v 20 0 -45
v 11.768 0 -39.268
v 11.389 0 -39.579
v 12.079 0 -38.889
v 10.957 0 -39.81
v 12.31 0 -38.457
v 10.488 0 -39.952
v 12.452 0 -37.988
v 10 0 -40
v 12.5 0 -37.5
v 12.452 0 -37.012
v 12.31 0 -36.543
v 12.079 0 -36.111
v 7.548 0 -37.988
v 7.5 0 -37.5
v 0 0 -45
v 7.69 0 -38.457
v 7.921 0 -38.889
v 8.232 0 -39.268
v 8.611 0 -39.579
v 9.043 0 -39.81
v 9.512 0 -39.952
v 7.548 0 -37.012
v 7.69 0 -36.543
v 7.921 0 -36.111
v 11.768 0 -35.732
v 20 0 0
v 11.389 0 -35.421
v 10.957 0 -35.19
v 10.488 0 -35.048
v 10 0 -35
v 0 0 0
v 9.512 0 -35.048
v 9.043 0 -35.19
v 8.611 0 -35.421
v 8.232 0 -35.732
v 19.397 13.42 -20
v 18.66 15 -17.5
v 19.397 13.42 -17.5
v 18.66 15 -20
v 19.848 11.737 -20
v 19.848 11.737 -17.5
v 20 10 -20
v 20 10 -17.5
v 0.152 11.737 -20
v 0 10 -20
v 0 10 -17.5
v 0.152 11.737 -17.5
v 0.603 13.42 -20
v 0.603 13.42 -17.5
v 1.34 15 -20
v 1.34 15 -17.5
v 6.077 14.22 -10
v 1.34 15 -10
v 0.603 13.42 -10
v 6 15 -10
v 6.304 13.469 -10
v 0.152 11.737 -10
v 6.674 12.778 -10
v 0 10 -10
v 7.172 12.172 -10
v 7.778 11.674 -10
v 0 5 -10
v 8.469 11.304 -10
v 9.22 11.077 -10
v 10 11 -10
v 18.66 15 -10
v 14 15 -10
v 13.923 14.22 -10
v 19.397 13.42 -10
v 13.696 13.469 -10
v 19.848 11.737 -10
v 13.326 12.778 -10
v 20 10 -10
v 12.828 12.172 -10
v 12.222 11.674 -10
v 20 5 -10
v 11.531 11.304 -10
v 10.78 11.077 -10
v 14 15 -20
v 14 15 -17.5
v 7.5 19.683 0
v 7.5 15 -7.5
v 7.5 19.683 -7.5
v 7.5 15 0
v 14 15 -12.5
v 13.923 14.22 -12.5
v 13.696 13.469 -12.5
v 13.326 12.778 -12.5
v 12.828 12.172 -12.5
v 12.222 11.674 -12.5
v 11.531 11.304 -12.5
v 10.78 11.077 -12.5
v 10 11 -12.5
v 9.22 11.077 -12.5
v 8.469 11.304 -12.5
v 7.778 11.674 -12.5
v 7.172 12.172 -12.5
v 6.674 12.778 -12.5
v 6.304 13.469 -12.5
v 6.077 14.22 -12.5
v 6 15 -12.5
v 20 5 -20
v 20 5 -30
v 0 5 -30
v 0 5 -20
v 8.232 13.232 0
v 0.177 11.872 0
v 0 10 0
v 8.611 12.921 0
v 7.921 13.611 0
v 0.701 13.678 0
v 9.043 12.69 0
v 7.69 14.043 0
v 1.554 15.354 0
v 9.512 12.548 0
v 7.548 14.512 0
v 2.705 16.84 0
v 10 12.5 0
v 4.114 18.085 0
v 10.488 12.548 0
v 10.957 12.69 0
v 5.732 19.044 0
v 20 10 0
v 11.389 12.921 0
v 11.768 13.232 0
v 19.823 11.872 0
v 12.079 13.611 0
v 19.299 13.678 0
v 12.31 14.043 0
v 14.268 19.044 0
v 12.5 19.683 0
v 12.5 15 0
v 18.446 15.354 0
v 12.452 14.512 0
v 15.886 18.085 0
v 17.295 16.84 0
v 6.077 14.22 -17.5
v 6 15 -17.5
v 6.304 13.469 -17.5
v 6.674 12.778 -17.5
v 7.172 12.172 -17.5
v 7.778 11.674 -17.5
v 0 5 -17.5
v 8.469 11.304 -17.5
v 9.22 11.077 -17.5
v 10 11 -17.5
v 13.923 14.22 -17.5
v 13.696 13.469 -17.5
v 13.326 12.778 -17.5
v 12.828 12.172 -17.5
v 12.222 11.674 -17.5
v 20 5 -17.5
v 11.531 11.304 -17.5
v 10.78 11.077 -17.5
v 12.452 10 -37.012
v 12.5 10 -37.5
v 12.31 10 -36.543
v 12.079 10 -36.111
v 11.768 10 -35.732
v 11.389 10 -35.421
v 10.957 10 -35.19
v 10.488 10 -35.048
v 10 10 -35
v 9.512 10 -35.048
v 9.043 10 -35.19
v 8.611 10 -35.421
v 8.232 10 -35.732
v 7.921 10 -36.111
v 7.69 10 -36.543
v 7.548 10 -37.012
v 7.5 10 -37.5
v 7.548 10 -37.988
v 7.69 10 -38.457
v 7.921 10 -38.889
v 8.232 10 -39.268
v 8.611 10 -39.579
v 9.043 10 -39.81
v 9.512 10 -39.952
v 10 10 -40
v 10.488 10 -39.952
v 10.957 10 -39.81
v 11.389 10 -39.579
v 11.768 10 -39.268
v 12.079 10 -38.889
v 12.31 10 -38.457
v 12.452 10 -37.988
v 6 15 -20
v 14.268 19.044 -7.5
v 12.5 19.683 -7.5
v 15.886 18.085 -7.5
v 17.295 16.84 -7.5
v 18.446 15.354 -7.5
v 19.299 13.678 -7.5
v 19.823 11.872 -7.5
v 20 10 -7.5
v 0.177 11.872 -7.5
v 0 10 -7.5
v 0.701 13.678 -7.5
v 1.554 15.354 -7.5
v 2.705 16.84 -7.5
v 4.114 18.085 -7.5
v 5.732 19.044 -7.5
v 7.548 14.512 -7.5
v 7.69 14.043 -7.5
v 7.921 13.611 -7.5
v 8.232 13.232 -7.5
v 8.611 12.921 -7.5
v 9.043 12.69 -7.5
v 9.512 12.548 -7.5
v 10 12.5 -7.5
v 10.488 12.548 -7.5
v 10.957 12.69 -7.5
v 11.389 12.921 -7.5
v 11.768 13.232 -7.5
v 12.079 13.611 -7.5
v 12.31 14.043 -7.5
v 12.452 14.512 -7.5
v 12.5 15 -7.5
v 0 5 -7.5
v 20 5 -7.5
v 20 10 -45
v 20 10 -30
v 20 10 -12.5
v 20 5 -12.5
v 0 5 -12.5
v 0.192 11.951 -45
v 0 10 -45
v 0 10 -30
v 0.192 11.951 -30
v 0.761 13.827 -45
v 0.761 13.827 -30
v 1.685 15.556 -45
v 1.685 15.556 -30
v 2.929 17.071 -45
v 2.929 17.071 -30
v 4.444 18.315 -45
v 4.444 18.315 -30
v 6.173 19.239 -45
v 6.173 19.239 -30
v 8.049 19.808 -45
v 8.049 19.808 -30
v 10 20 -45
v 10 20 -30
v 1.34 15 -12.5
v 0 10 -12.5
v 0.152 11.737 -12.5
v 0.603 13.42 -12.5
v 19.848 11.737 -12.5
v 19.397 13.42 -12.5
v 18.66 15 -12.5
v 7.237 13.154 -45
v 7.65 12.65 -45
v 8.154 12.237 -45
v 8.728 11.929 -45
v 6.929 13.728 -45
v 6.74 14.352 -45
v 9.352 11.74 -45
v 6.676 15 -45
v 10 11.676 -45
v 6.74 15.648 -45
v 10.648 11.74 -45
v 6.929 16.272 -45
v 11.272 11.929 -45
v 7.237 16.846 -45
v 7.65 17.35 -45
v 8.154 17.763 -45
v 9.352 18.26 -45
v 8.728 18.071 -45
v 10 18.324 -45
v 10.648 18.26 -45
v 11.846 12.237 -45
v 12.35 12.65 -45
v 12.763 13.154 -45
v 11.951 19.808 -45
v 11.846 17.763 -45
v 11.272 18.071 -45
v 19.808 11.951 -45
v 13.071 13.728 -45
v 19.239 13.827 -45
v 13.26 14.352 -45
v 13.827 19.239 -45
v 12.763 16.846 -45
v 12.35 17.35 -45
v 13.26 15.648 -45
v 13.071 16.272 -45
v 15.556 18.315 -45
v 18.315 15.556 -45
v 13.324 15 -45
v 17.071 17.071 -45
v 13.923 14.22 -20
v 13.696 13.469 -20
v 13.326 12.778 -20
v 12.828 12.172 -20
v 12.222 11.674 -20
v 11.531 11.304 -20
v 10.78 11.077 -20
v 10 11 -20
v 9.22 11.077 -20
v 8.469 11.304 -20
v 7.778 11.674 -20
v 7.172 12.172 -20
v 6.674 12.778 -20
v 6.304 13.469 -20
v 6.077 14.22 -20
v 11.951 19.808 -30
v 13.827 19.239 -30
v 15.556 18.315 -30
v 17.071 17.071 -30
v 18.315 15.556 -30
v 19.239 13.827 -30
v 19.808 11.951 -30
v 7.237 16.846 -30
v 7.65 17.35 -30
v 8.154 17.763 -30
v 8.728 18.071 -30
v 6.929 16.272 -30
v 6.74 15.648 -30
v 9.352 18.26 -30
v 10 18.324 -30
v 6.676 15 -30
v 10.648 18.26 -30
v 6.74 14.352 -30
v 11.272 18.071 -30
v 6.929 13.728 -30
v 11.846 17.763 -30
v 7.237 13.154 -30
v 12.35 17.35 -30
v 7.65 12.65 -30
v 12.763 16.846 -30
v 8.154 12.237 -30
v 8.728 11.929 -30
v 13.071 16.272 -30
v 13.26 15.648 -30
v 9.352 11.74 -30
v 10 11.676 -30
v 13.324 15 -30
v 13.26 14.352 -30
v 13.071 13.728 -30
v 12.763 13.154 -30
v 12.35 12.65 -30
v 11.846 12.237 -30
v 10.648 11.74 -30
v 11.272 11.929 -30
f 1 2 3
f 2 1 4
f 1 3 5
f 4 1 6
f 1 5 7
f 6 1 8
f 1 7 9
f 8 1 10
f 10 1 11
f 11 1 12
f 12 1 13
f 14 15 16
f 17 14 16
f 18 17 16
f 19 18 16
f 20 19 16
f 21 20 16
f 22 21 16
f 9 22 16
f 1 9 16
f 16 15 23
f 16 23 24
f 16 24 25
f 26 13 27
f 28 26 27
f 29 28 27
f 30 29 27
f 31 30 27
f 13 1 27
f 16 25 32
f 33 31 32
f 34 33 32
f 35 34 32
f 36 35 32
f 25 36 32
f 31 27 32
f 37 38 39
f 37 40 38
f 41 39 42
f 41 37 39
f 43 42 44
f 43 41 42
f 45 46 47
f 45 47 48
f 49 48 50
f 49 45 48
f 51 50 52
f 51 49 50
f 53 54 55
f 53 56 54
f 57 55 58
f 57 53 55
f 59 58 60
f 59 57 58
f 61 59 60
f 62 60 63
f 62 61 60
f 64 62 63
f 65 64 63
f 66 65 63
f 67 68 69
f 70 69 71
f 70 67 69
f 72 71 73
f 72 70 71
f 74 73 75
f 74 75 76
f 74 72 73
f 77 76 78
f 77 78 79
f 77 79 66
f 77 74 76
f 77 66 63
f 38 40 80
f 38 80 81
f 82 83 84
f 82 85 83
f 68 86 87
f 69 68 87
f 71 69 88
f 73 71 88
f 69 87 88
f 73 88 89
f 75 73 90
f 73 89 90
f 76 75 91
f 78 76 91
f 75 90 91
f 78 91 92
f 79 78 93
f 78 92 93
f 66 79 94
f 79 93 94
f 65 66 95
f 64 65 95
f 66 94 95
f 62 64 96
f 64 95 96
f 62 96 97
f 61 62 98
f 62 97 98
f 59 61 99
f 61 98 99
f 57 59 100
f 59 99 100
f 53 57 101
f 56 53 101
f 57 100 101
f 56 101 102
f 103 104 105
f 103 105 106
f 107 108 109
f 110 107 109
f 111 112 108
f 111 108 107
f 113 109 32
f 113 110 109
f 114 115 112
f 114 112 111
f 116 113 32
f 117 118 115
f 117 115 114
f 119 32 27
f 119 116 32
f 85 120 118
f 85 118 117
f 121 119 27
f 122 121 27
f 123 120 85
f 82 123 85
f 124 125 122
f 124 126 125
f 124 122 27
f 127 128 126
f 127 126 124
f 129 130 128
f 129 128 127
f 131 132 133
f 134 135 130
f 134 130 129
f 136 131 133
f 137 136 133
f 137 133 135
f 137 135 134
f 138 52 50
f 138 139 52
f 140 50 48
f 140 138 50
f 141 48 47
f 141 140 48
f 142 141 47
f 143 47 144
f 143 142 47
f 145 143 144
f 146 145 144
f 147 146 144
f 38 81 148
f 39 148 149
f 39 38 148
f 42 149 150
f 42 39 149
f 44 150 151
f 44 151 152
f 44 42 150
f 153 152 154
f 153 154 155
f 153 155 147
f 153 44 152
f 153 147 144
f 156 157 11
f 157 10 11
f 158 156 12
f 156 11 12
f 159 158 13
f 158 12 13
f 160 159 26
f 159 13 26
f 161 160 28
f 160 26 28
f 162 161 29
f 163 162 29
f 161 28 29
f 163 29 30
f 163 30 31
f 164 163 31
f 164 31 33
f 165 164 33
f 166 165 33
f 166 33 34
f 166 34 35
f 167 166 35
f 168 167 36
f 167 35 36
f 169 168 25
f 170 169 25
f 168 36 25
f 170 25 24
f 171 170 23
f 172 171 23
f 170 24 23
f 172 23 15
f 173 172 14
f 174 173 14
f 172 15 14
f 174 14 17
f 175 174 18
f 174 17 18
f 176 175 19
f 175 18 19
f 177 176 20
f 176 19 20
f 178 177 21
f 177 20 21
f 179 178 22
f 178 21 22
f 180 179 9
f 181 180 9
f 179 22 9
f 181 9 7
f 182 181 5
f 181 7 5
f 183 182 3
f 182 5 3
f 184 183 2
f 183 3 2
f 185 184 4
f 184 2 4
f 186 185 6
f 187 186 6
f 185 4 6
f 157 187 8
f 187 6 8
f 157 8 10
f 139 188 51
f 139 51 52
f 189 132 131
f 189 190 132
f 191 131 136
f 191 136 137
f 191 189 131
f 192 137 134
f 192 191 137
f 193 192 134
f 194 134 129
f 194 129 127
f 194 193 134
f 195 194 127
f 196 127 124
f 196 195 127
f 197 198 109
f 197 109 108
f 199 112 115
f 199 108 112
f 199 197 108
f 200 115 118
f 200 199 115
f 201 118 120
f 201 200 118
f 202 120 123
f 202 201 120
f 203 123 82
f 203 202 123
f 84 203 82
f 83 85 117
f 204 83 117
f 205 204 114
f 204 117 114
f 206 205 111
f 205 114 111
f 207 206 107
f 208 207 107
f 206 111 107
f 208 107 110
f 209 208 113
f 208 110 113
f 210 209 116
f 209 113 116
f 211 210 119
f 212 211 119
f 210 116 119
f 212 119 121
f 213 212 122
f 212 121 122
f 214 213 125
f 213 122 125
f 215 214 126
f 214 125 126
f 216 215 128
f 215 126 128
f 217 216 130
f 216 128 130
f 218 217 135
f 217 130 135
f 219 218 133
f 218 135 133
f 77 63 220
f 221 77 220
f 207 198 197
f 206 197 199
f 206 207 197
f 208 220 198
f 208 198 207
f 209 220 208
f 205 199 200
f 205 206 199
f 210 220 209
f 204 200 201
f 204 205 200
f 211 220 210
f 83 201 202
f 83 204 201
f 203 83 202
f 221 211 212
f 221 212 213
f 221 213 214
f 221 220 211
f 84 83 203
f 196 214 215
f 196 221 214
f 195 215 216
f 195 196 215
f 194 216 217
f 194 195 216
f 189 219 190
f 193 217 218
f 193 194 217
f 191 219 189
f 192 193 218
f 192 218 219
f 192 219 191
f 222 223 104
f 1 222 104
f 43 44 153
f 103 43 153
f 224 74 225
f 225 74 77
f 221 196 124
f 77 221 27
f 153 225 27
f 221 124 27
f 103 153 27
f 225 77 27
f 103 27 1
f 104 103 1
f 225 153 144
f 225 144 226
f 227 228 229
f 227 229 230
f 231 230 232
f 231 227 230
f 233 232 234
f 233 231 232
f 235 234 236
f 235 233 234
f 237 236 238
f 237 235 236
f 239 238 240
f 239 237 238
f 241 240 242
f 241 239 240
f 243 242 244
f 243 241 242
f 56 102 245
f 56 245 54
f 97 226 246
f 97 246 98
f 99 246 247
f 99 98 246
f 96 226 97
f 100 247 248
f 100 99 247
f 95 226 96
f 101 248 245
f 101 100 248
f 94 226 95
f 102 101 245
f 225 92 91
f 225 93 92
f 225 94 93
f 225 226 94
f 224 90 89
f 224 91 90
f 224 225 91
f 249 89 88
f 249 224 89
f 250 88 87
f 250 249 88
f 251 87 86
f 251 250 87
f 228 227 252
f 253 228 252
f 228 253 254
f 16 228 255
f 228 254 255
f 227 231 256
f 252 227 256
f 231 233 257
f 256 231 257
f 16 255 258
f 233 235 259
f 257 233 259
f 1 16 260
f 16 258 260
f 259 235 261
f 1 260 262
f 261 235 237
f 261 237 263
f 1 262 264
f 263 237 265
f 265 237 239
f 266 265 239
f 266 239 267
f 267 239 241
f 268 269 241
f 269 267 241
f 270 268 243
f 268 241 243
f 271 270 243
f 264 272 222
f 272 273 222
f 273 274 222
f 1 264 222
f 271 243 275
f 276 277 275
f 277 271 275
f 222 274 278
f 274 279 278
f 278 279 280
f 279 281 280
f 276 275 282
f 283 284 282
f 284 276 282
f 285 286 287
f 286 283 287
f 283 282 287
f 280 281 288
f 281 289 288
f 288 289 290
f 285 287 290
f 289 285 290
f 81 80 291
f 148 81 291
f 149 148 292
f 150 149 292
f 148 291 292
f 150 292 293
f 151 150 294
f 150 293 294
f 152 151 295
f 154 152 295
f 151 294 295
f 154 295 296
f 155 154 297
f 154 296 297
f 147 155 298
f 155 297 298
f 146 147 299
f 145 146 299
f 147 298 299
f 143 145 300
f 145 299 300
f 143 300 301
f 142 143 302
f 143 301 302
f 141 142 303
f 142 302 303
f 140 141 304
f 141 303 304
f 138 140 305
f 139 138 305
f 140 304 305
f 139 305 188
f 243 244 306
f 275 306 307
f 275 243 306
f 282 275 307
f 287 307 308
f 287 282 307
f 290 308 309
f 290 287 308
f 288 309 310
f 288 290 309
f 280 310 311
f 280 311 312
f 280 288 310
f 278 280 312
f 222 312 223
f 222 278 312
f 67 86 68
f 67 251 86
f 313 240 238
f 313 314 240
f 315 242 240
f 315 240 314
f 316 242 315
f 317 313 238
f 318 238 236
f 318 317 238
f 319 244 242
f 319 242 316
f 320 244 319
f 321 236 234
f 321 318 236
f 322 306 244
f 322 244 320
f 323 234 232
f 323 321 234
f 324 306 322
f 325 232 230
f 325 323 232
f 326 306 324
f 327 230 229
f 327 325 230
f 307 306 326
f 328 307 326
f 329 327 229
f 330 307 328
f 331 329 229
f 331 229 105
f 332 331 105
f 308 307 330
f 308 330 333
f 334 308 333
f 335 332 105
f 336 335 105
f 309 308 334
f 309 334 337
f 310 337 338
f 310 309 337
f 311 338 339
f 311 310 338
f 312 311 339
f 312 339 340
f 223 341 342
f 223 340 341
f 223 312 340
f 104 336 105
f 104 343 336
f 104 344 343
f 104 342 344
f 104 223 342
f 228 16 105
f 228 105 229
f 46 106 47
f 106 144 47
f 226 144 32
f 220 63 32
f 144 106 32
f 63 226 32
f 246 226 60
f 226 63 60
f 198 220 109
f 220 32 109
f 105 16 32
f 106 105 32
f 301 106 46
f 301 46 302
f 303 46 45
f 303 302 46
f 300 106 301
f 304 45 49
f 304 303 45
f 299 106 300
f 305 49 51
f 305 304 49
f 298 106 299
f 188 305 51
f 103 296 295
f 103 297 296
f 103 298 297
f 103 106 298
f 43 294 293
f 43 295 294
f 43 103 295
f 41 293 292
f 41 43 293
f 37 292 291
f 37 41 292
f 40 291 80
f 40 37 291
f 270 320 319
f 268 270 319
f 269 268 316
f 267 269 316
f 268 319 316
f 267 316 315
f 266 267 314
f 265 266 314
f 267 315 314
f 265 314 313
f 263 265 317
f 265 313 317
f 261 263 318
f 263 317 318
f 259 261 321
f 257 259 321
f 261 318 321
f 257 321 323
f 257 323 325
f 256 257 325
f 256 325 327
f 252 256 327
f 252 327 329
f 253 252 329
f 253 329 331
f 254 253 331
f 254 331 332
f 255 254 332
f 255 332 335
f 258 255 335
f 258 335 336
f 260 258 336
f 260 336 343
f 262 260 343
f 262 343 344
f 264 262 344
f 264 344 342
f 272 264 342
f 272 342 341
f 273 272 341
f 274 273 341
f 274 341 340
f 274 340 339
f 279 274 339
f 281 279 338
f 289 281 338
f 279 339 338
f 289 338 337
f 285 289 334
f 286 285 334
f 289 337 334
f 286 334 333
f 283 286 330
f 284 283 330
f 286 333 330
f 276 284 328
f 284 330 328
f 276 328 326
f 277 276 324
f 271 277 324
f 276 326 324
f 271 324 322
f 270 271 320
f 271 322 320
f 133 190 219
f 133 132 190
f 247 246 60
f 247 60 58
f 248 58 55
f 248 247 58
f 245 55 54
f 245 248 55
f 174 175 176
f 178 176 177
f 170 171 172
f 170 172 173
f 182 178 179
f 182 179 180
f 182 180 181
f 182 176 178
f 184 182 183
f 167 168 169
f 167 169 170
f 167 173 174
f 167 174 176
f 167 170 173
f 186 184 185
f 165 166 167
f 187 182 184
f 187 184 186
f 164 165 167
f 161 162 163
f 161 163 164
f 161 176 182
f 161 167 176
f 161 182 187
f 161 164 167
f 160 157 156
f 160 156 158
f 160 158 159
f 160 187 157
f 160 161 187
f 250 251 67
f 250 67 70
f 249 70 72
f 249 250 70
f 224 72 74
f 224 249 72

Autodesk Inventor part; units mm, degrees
ref_plane "YZ Plane" through (0, 0, 0) normal (1, 0, 0) x (0, 1, 0)
ref_plane "XZ Plane" through (0, 0, 0) normal (0, 1, 0) x (-1, 0, 0)
ref_plane "XY Plane" through (0, 0, 0) normal (0, 0, 1) x (1, 0, 0)
sketch "Sketch1" plane through (0, 0, 0) normal (0, 0, 1) x (1, 0, 0)
  line L0 (0, 20) -> (20, 20)
  line L1 (20, 20) -> (20, 0)
  line L2 (20, 0) -> (0, 0)
  line L3 (0, 0) -> (0, 20)
  dimension "d0" = 20
  dimension "d1" = 20
extrude "Extrusion1" add sketch "Sketch1" against normal blind 45
fillet "Fillet1" radius 10 2 edges at (0, 20, -22.5) (20, 20, -22.5)
sketch "Sketch2" plane through (20, 0, 0) normal (1, 0, 0) x (0, 0, -1)
  line L0 (20, 21) -> (30, 21)
  line L1 (30, 21) -> (30, 5)
  line L2 (30, 5) -> (20, 5)
  line L3 (20, 5) -> (20, 21)
  line L4 (12.5, 21) -> (17.5, 21)
  line L5 (17.5, 21) -> (17.5, 5)
  line L6 (17.5, 5) -> (12.5, 5)
  line L7 (12.5, 5) -> (12.5, 21)
  line L8 (7.5, 21) -> (10, 21)
  line L9 (10, 21) -> (10, 5)
  line L10 (10, 5) -> (7.5, 5)
  line L11 (7.5, 5) -> (7.5, 21)
  line L12 (45, 10) -> (45, 0) projected
  line L13 (0, 0) -> (45, 0) projected
  point P0 (25, 5)
  dimension "d5" = 15
  dimension "d6" = 25
  dimension "d7" = 27.5
  dimension "d8" = 32.5
  dimension "d9" = 35
  dimension "d10" = 37.5
  dimension "d11" = 5
  dimension "d12" = 21
extrude "Extrusion2" cut sketch "Sketch2" against normal blind 45
sketch "Sketch3" plane through (20, 0, 0) normal (1, 0, 0) x (0, 0, -1)
  line L0 (9.5, 21) -> (20.5, 21)
  line L1 (20.5, 21) -> (20.5, 15)
  line L2 (20.5, 15) -> (9.5, 15)
  line L3 (9.5, 15) -> (9.5, 21)
  line L4 (0, 0) -> (45, 0) projected
  line L5 (10, 10) -> (10, 20) projected
  line L6 (20, 20) -> (20, 10) projected
  point P0 (15, 15)
  dimension "d15" = 15
  dimension "d16" = 6
  dimension "d17" = 0.5
  dimension "d18" = 0.5
extrude "Extrusion3" cut sketch "Sketch3" against normal blind 45
sketch "Sketch4" plane through (0, 0, -45) normal (0, 0, -1) x (-1, 0, 0)
  circle A0 centre (-10, 15) radius 2
  line L0 (-20, 0) -> (0, 0) projected
  arc A1 (0, 10) -> (-20, 10) centre (-10, 10) ccw projected
  point P0 (-10, 20)
  dimension "d21" = 4
  dimension "d22" = 15
hole "Hole1" at (10, 15, -45) direction (0, 0, 1) diameter 6.647 depth 25 thread size "M8x1.25" class "6H" standard "ISO Metric profile"
sketch "Sketch5" plane through (0, 0, 0) normal (0, 0, 1) x (1, 0, 0)
  circle A0 centre (10, 15) radius 3.3235 projected
  arc A1 (7.5, 15) -> (12.5, 15) centre (10, 15) ccw
  line L0 (7.5, 21) -> (12.5, 21)
  line L1 (12.5, 21) -> (12.5, 15)
  line L2 (7.5, 15) -> (7.5, 21)
  point P0 (0, 0)
  dimension "d31" = 5
  dimension "d32" = 2.5
  dimension "d33" = 2.5
  dimension "d34" = 6
extrude "Extrusion4" cut sketch "Sketch5" against normal up to surface (10 mm away) contours L1 A1 L2 A0 | A0 L2 L0 L1 picked at (9.8656, 16.0996)
sketch "Sketch6" plane through (20, 5, -20) normal (0, 0, -1) x (-1, 0, 0)
  arc A0 (7.5, 10) -> (12.5, 10) centre (10, 10) ccw projected
  circle A1 centre (10, 10) radius 4
  point P0 (20, -5)
  dimension "d37" = 8
extrude "Extrusion5" cut sketch "Sketch6" against normal up to surface (12.5 mm away)
sketch "Sketch7" plane through (0, 0, 0) normal (0, -1, 0) x (1, 0, 0)
  circle A0 centre (10, -37.5) radius 2.5
  line L0 (20, -45) -> (0, -45) projected
  point P0 (0, 0)
  point P1 (10, -45)
  dimension "d40" = 5
  dimension "d41" = 7.5
extrude "Extrusion6" cut sketch "Sketch7" against normal blind 10
properties part number "Extractor Body"
